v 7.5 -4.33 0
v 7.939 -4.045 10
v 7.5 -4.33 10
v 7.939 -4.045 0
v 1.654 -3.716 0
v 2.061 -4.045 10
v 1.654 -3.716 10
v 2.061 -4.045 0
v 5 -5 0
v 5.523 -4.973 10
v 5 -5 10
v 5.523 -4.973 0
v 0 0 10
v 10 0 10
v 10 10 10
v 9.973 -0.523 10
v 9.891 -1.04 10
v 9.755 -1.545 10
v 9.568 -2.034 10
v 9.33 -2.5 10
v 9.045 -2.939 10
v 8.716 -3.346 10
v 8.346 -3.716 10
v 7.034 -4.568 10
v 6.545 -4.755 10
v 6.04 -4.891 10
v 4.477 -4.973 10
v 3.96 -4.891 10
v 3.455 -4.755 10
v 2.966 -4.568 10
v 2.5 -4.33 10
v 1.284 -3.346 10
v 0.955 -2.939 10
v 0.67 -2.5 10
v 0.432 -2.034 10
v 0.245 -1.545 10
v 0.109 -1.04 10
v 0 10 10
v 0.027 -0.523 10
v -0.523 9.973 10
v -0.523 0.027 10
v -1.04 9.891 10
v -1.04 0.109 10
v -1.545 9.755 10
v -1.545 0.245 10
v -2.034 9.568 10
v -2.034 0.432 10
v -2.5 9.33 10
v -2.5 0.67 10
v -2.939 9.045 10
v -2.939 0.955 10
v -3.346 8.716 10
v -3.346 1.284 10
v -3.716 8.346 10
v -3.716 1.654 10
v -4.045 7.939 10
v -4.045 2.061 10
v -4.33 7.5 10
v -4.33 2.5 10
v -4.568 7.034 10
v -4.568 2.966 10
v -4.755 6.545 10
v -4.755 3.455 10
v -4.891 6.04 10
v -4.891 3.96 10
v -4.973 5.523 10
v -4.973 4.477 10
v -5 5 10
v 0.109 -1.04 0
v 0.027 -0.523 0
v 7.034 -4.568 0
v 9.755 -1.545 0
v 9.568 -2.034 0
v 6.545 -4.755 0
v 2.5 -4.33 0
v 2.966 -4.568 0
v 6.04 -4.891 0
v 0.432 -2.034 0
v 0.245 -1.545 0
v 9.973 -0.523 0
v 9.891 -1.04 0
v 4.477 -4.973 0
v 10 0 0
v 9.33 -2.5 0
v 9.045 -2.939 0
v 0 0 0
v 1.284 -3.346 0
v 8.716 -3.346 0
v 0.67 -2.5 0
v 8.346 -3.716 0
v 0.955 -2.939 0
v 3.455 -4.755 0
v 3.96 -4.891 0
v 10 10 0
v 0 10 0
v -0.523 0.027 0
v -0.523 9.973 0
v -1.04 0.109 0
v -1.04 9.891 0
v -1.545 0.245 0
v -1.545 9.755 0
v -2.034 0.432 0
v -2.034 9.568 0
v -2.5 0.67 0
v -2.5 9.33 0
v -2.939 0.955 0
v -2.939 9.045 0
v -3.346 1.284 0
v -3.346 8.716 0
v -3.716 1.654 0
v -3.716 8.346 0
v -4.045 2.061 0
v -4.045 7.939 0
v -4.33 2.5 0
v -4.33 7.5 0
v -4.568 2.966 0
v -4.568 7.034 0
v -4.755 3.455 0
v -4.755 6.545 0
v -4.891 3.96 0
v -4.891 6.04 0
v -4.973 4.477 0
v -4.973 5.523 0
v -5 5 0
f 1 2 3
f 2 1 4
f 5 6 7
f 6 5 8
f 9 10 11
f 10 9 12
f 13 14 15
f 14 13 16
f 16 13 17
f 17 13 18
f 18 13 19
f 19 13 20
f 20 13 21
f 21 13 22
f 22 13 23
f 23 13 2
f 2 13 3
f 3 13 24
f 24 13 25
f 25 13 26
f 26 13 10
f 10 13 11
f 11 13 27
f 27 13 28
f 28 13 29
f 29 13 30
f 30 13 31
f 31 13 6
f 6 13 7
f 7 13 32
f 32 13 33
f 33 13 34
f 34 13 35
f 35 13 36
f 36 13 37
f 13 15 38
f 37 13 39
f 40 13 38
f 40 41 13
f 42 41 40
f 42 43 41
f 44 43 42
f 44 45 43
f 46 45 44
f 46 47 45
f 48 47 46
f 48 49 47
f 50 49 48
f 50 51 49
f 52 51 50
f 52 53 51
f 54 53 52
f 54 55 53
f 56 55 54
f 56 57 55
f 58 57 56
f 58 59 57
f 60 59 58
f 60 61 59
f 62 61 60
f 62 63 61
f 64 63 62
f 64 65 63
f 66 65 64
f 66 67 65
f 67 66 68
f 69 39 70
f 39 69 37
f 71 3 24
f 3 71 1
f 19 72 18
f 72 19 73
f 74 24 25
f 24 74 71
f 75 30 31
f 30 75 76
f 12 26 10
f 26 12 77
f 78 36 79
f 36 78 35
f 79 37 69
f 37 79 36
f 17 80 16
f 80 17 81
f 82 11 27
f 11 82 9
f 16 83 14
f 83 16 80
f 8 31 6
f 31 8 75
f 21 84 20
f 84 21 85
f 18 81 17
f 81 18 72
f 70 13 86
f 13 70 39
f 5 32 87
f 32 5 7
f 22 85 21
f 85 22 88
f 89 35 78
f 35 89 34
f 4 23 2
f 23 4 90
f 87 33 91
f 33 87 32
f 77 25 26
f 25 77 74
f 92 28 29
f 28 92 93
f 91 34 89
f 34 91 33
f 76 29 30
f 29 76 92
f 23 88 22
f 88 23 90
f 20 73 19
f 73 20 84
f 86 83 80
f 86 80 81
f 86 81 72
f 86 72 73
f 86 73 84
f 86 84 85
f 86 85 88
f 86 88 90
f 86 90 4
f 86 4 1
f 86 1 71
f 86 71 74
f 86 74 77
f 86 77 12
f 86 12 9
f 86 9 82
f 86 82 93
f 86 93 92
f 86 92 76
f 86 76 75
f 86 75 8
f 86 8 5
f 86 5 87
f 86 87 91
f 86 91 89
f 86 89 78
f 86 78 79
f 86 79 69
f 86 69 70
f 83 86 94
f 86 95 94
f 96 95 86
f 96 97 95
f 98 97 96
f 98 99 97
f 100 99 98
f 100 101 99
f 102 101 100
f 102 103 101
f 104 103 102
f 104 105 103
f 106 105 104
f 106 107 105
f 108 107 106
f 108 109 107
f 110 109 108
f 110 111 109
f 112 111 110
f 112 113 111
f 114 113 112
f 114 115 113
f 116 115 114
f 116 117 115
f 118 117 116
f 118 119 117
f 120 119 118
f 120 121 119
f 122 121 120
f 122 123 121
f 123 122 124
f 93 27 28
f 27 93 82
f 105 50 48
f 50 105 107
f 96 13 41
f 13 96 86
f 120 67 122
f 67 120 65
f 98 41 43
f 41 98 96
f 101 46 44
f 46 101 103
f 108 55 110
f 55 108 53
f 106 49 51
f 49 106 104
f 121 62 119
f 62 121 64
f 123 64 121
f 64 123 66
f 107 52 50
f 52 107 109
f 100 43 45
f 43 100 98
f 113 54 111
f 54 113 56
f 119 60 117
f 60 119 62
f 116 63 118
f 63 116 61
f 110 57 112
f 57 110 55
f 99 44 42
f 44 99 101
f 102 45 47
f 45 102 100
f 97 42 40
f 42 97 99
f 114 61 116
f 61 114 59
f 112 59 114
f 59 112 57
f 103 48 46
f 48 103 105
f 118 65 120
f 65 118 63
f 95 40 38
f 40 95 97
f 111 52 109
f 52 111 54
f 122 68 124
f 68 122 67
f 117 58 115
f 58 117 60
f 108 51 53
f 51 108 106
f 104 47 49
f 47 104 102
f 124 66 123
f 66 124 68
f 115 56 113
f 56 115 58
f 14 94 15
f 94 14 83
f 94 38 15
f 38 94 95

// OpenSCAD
$fn=60;
color("red")
cube(10);
color("red")
translate([5,0,0])
union(){
cylinder(h=10,d=10);
    color("red")
translate([-5,5,0])cylinder(h=10,d=10);}
